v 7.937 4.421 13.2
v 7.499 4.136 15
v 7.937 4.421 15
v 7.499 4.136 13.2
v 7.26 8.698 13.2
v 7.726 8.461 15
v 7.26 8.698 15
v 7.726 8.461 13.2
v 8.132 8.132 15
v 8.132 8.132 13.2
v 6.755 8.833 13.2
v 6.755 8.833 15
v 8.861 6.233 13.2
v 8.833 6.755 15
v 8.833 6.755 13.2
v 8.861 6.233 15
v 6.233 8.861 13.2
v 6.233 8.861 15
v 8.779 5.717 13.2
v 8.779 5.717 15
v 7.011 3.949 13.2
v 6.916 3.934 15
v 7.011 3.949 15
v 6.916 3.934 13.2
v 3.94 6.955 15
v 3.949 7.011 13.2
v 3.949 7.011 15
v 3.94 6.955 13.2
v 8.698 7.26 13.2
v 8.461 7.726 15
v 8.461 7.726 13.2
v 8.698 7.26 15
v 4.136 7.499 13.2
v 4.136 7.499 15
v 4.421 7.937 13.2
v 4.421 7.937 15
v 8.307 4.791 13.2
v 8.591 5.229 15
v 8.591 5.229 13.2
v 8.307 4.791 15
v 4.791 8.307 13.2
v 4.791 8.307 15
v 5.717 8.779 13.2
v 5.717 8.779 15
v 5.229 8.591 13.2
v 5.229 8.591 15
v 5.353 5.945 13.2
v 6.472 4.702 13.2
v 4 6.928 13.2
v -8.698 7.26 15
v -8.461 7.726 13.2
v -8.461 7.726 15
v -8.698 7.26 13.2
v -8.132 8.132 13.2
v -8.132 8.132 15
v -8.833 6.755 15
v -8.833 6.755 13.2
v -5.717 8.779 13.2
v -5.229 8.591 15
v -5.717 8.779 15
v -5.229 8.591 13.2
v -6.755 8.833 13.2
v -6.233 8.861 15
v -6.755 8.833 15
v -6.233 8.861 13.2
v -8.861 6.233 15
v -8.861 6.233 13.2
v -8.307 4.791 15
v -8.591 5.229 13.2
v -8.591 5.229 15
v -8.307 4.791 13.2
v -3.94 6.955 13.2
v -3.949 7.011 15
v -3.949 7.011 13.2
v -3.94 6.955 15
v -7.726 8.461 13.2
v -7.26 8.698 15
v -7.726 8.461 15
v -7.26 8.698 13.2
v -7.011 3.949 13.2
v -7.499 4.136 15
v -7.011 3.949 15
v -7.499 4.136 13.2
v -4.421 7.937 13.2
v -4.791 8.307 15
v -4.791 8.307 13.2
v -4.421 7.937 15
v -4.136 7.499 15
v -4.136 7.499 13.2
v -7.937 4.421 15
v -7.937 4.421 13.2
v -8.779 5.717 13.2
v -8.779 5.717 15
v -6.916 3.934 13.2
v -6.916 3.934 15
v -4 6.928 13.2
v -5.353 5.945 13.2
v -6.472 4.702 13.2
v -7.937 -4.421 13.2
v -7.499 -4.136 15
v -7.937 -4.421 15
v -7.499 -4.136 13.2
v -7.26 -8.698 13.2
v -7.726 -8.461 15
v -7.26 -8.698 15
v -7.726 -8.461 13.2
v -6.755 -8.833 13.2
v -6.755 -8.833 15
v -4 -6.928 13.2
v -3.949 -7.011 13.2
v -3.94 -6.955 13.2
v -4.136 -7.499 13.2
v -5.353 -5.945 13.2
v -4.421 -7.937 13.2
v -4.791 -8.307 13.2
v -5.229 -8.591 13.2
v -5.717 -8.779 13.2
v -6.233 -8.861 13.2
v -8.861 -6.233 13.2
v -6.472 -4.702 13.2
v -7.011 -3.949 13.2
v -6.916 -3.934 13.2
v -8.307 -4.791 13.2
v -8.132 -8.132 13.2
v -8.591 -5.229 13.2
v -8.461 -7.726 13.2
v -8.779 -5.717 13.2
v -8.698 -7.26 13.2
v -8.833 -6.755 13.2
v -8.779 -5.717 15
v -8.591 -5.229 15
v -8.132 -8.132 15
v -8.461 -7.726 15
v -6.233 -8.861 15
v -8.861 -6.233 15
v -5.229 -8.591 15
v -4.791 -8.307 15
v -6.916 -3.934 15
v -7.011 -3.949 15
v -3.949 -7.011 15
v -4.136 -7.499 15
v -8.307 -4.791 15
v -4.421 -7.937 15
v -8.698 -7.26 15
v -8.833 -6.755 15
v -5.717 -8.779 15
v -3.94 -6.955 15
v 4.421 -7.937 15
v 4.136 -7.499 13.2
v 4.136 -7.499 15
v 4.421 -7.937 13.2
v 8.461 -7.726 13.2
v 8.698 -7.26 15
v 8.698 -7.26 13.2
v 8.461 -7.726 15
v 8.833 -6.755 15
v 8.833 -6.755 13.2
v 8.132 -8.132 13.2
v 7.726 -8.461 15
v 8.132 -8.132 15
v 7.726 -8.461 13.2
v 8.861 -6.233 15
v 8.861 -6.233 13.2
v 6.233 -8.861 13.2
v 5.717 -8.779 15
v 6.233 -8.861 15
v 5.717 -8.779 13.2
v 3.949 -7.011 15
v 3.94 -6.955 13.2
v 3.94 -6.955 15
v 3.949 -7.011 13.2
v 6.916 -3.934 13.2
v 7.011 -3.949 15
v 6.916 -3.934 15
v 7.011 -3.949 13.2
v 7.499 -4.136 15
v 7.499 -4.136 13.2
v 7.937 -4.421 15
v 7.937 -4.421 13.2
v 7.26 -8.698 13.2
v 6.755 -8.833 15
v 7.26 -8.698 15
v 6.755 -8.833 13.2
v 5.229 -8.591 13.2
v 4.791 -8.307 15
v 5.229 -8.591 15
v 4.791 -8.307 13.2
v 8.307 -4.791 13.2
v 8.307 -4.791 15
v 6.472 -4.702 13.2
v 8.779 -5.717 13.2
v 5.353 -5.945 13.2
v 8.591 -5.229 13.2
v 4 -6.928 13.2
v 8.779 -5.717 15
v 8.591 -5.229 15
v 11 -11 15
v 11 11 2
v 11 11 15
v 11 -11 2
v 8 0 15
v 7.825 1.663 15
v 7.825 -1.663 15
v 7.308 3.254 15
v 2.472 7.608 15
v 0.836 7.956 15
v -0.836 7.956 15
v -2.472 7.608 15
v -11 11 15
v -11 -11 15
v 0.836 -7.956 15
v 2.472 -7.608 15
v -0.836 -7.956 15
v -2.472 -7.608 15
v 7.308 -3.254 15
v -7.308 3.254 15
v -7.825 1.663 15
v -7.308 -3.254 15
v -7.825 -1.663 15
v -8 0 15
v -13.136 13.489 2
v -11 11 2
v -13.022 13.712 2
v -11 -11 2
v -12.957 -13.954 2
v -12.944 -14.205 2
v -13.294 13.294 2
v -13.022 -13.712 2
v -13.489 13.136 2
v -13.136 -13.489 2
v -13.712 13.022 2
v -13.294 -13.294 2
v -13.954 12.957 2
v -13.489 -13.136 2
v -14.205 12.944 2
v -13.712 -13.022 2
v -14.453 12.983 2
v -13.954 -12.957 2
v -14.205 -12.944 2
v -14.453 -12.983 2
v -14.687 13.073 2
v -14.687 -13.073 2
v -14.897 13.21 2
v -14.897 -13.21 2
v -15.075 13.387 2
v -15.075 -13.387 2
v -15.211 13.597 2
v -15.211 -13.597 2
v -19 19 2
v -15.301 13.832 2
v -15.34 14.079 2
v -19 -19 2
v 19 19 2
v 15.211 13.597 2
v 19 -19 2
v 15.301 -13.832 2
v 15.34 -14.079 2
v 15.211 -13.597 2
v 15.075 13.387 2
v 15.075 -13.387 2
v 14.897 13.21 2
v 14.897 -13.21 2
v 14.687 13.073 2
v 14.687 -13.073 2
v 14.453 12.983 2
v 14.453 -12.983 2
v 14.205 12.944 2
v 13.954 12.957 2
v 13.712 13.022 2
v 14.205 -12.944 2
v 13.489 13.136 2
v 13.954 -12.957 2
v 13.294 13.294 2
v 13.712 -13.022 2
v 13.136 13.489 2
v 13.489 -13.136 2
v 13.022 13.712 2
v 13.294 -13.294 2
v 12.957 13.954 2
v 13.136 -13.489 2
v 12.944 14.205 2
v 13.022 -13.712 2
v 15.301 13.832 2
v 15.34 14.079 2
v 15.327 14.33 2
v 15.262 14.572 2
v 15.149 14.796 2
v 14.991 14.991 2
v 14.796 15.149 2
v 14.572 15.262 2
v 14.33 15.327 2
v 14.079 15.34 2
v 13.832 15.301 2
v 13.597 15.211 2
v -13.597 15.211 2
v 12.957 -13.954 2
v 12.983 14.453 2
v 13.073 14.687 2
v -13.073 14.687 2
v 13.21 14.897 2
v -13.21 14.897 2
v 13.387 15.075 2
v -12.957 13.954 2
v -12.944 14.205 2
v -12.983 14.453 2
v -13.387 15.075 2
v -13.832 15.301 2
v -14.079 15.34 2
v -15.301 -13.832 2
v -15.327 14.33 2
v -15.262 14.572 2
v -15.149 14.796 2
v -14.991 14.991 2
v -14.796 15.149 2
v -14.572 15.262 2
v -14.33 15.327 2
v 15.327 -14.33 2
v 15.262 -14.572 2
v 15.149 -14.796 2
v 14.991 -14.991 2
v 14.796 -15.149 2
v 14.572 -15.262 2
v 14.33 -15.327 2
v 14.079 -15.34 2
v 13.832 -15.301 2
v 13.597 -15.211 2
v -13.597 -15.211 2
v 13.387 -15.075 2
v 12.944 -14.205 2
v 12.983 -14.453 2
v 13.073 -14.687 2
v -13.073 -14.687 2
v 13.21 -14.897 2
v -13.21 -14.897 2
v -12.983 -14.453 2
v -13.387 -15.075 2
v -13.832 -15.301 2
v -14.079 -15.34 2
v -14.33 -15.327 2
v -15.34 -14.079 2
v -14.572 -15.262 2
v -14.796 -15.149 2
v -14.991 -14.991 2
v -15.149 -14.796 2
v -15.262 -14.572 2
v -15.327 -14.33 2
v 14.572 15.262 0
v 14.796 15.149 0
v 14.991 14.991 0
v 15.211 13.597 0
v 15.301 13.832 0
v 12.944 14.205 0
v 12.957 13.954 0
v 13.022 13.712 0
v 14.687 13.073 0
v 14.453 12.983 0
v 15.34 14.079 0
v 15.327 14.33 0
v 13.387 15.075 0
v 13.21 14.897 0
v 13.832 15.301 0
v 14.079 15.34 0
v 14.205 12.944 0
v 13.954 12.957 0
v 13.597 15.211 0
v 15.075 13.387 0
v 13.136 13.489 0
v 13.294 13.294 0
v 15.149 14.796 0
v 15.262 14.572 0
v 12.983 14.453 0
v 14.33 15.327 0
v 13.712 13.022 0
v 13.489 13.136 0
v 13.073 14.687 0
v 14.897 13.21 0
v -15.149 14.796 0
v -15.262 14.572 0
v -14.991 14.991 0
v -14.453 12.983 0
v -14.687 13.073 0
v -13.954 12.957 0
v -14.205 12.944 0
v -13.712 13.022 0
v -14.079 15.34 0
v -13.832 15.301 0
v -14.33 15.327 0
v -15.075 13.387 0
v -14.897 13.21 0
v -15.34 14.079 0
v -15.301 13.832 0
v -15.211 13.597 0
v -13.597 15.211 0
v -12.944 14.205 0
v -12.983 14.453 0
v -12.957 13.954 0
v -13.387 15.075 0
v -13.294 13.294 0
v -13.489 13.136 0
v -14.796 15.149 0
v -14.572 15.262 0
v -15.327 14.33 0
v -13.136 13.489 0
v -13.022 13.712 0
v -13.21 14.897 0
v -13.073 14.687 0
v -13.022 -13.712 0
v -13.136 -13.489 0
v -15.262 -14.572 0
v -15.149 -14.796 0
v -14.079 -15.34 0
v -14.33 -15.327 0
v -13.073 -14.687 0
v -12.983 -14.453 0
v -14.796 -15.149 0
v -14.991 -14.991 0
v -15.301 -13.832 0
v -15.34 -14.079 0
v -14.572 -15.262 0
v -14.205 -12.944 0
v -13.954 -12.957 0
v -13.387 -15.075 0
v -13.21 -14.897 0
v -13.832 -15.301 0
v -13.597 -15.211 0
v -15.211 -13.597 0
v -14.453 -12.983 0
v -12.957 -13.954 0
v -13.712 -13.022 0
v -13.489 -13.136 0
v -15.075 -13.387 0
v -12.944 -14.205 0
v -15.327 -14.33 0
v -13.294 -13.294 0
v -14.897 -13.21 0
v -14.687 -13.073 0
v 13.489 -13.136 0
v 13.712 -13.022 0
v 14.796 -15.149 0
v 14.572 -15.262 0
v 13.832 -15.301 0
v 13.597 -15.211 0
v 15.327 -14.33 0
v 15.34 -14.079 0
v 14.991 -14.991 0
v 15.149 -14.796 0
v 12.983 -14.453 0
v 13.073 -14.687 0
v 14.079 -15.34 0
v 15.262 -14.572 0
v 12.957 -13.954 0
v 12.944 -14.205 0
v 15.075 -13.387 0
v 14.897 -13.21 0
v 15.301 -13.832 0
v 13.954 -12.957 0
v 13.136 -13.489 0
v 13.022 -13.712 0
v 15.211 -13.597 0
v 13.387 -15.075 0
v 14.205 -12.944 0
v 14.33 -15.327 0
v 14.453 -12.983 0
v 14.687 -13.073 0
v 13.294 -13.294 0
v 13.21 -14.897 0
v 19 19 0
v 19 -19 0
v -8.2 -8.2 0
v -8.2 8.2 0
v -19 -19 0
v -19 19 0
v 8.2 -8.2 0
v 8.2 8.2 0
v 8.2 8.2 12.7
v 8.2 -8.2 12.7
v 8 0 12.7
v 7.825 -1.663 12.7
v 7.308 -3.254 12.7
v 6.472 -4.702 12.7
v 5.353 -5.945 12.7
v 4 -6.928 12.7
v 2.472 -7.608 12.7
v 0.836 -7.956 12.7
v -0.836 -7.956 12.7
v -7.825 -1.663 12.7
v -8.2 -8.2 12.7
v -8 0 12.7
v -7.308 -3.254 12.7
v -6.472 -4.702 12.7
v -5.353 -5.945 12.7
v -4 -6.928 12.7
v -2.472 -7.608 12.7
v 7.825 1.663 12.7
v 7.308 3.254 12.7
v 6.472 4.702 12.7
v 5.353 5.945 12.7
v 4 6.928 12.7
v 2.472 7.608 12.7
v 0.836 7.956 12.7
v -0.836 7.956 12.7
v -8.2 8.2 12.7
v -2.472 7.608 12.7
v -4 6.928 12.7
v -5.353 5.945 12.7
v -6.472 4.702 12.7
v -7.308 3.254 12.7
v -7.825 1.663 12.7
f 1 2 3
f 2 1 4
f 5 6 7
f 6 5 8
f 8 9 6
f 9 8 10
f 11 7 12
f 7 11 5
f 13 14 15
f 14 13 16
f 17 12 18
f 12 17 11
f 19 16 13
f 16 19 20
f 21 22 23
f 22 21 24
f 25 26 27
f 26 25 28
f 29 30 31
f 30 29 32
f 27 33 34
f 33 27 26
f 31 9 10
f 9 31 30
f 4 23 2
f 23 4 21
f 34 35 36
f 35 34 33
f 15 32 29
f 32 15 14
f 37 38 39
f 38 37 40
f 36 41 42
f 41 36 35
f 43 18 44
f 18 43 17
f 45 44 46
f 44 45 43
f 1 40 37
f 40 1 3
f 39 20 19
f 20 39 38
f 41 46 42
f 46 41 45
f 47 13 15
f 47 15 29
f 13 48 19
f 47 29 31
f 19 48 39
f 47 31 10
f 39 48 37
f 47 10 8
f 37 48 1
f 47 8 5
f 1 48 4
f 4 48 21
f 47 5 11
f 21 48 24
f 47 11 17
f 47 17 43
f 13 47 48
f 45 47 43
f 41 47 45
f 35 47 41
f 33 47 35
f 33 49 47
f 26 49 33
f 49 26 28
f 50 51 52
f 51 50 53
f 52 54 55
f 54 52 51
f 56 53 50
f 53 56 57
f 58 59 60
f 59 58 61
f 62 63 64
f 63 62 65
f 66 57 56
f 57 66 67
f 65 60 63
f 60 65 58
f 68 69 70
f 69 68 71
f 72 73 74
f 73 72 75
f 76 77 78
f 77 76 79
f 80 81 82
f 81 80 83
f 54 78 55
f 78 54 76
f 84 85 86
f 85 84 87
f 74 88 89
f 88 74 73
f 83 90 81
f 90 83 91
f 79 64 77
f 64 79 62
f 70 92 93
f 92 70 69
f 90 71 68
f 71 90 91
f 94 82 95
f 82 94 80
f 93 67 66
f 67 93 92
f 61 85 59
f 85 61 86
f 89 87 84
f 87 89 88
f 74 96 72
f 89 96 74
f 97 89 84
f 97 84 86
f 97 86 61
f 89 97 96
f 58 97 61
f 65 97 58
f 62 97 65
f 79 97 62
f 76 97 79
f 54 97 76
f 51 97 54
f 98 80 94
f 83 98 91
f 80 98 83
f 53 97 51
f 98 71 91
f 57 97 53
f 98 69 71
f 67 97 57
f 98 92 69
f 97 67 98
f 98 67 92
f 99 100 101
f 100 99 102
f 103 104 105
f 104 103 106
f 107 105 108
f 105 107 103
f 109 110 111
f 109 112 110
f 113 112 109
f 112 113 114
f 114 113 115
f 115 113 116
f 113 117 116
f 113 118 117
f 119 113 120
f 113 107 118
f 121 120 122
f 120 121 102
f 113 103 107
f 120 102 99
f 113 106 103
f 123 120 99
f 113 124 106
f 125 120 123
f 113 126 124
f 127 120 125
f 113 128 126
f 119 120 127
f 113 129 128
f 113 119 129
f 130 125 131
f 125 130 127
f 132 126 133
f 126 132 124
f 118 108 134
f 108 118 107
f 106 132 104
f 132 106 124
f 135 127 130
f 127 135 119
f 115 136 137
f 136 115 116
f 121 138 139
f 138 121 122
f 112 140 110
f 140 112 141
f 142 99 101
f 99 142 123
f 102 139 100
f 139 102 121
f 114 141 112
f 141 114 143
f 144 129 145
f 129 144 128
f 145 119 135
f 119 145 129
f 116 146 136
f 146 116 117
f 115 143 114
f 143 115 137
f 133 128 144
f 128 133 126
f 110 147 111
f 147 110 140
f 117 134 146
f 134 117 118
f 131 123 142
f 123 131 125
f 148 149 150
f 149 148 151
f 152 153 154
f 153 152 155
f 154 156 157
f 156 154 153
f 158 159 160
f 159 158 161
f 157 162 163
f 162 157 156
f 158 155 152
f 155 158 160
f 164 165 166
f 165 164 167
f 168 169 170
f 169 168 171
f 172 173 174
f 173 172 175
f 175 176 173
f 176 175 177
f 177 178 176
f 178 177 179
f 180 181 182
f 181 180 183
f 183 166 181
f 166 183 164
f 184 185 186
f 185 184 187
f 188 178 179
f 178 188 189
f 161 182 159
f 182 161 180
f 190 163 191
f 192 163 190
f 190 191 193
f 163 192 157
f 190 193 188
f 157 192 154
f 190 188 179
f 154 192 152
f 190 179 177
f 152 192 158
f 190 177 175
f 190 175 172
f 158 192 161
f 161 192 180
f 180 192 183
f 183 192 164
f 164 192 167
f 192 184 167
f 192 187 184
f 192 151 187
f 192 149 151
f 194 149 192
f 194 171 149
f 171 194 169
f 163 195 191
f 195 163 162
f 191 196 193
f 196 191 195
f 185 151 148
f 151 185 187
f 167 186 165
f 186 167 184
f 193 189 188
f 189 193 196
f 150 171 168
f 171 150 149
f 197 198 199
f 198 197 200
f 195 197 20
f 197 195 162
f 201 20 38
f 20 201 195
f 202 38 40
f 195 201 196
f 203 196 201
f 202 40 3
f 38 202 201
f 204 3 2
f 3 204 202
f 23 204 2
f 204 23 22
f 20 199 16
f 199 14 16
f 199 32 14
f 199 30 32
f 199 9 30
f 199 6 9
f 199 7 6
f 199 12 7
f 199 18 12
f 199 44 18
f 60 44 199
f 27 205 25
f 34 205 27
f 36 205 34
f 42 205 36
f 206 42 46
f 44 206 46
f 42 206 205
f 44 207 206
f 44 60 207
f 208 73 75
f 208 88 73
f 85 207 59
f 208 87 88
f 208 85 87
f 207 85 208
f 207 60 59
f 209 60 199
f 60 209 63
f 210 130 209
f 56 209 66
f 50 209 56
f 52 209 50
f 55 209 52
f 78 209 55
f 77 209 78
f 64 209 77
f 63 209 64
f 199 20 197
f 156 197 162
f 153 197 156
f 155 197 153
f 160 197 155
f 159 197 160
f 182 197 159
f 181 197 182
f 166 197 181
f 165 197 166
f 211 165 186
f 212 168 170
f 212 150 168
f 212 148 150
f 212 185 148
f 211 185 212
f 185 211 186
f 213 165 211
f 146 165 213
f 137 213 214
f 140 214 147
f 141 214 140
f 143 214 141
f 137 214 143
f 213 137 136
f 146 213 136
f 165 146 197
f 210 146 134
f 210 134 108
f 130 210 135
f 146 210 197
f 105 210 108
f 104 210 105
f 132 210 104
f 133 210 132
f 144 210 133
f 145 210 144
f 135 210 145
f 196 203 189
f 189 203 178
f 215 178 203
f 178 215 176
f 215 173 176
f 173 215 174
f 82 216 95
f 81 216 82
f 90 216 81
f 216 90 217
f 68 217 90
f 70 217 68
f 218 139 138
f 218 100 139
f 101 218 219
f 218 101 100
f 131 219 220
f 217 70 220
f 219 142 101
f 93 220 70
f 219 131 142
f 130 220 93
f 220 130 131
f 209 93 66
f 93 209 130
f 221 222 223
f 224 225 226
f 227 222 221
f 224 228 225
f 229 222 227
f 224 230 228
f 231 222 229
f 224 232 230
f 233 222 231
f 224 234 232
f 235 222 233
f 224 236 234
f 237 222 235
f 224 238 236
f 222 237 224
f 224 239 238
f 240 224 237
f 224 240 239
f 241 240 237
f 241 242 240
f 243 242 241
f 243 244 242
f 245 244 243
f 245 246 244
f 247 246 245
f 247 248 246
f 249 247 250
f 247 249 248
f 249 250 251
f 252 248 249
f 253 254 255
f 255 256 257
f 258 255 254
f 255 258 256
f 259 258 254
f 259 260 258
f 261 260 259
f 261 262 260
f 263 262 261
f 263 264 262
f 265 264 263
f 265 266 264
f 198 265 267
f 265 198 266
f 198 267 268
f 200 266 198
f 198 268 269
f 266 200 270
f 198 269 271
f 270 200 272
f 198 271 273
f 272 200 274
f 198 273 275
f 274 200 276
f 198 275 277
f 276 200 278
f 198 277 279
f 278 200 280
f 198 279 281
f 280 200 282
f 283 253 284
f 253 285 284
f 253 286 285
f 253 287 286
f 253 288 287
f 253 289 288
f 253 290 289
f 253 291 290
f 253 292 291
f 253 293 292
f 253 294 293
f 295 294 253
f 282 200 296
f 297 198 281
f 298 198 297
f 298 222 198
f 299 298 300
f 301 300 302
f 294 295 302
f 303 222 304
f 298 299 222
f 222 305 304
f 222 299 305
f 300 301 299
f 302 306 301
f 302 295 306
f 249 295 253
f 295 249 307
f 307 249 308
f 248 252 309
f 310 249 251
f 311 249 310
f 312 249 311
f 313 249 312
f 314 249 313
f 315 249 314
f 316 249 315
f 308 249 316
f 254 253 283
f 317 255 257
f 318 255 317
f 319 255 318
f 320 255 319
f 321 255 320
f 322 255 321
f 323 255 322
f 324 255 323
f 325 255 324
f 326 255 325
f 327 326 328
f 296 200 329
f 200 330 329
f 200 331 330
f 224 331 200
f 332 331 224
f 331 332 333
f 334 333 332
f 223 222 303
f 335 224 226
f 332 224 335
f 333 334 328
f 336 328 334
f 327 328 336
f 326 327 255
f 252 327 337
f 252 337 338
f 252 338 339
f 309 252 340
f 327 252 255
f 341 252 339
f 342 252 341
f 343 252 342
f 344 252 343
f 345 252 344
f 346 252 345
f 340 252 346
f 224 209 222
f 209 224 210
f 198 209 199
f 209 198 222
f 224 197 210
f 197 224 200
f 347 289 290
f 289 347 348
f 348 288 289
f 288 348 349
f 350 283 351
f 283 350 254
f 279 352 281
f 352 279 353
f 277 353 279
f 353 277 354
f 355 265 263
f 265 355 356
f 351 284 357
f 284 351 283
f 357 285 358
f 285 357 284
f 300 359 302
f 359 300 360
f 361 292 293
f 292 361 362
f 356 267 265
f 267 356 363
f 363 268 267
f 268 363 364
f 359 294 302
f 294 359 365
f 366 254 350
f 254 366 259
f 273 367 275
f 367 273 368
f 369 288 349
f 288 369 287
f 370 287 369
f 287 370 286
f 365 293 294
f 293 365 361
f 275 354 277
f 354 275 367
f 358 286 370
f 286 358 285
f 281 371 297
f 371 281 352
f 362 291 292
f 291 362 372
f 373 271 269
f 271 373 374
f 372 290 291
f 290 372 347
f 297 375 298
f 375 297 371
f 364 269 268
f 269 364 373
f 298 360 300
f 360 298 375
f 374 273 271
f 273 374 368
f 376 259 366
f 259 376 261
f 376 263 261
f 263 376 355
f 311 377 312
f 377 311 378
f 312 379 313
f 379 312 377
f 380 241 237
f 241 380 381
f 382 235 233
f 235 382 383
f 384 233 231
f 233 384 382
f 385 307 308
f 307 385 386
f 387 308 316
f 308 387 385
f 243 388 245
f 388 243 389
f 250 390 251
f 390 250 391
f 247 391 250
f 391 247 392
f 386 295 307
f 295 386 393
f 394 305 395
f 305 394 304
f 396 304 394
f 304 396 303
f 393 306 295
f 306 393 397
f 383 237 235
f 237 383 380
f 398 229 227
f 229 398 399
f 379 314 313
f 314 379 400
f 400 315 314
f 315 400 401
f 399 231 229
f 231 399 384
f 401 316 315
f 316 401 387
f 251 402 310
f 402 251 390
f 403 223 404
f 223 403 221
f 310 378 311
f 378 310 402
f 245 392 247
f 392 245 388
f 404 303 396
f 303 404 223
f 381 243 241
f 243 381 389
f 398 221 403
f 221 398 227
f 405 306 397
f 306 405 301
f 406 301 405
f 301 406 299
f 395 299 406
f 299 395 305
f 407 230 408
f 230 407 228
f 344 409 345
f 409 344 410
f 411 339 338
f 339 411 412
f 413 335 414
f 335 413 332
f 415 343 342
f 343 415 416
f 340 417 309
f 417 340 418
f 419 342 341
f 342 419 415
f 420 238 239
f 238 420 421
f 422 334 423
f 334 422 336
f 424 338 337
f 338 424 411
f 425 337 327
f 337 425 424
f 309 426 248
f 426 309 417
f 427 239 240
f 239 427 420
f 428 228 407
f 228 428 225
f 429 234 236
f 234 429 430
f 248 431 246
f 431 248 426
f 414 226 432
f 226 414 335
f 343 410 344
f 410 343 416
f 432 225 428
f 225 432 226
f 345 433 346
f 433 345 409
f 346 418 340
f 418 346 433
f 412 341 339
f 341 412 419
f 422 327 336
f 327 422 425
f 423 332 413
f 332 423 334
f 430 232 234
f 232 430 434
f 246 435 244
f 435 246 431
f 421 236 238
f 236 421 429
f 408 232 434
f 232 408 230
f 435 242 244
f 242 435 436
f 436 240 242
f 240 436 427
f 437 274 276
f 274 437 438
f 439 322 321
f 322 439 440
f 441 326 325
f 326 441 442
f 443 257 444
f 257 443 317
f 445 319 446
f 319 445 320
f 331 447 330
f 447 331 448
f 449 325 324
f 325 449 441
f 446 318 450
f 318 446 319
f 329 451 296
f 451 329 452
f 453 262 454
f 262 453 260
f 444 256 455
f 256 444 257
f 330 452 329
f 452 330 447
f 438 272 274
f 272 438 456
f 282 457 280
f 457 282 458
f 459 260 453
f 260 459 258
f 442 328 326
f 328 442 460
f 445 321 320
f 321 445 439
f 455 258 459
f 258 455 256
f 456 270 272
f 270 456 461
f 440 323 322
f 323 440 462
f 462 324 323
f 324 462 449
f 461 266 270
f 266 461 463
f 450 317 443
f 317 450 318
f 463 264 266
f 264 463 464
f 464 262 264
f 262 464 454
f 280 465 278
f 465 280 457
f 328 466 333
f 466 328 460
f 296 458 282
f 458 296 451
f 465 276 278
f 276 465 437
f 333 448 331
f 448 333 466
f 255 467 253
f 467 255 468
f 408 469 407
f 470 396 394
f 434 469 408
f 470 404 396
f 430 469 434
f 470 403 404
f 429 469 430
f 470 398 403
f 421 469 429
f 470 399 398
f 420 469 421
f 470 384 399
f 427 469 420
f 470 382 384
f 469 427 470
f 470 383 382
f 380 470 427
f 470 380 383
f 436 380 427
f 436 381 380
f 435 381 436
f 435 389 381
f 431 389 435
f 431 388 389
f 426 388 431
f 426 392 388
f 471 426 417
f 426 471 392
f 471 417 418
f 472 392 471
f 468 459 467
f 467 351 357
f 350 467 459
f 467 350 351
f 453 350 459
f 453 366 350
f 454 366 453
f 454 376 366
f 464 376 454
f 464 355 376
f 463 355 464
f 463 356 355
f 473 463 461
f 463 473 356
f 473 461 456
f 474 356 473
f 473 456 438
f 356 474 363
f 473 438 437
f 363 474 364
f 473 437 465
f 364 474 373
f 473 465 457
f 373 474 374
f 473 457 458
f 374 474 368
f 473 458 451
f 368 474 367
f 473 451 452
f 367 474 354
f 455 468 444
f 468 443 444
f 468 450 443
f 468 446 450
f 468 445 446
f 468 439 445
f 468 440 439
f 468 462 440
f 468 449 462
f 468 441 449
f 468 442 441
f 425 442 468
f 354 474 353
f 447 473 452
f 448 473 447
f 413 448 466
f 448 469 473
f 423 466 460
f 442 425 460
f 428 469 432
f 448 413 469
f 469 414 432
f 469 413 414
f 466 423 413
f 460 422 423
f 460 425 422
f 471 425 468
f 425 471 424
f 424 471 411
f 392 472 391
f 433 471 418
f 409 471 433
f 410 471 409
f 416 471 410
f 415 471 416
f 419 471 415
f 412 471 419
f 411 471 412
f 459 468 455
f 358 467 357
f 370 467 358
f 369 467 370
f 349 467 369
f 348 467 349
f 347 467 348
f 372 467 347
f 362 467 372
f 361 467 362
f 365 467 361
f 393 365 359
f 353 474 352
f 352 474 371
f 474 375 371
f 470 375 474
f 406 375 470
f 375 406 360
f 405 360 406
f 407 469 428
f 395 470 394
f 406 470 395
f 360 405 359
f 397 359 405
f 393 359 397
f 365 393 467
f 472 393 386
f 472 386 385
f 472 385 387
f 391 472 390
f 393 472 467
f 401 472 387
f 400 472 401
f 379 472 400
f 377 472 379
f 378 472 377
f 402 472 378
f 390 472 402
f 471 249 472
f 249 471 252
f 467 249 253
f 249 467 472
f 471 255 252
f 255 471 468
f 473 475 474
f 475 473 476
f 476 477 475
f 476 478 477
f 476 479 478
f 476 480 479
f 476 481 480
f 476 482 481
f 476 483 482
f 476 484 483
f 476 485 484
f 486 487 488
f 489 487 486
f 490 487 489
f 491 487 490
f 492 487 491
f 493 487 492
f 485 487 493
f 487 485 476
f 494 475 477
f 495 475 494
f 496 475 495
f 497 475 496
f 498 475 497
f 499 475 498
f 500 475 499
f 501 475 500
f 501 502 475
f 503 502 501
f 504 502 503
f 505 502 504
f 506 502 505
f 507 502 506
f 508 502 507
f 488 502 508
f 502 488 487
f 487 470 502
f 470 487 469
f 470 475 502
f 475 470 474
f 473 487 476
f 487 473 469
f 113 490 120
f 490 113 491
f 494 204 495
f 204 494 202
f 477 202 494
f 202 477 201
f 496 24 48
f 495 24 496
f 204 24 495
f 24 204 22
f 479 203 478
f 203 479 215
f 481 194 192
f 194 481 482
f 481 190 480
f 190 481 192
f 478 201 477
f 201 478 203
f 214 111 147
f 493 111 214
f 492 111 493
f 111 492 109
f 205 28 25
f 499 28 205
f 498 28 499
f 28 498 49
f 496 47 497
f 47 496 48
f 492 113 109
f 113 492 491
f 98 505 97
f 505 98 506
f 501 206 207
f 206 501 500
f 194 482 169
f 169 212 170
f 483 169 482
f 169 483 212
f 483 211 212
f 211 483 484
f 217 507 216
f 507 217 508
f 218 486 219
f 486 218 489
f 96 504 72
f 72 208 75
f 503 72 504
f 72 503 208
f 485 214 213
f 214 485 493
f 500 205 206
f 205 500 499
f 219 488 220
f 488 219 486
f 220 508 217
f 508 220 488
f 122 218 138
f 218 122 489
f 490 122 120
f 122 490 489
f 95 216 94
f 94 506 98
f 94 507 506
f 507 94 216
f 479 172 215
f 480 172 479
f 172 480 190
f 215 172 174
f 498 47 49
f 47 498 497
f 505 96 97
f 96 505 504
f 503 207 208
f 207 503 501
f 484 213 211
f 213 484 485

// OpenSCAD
$fn = 30;

base_l = 38;
base_b = 38;
base_h = 2;
base_hole_od=2.4;
base_hole_off_r = 20;

base_rim_h=5;
base_rim_t=4.3;

mount_l = 22;
mount_b = 22;
mount_h = 13;
mount_t = 2.8;

spring_od = 5;
spring_h = 1.8;     
spring_off_r = 9;


lens_od = 16;




//mount +  base + holes - lens
difference(){


    //mount -mountOffset +  base + holes

    difference(){
    
    //mount + base + holes
    union()
    {
        
        //mount with spring holes
        translate([0,0,base_h])difference(){
        
        //mount cube
        translate([0,0,mount_h/2])cube([mount_l,mount_b,mount_h],center=true);
        
        
        //spring mount holes
        
        translate([0,0,mount_h-spring_h])holeDriller(hole_od=spring_od, hole_h=spring_h+1,off_r=spring_off_r, angle_start=45);
        }
        
       
       //base with holes
       difference(){
        //base
        translate([0,0,base_h/2])cube([base_l,base_b,base_h],center=true);
        
        //base mount holes
        translate([0,0,-0.5])holeDriller(hole_od=base_hole_od, hole_h=base_h+1,off_r=base_hole_off_r, angle_start=45);
        }
        
        }


        //mount offset diff cube
        mount_offset_h=base_h+mount_h-mount_t;
        
         translate([0,0,mount_offset_h/2]) cube([mount_l-2*mount_t,mount_b-2*mount_t,mount_offset_h+1],center=true);
    }



// lens diff cylinder
cylinder(mount_h*2,d=lens_od);
}



/////////////////////////////////////////////////
module holeDriller(hole_od, hole_h,off_r, angle_start){

        for(i = [angle_start:90:360]){
            rotate([0,0,i])
            translate([off_r,0,0])cylinder(hole_h,d=hole_od);
         }            
    }
